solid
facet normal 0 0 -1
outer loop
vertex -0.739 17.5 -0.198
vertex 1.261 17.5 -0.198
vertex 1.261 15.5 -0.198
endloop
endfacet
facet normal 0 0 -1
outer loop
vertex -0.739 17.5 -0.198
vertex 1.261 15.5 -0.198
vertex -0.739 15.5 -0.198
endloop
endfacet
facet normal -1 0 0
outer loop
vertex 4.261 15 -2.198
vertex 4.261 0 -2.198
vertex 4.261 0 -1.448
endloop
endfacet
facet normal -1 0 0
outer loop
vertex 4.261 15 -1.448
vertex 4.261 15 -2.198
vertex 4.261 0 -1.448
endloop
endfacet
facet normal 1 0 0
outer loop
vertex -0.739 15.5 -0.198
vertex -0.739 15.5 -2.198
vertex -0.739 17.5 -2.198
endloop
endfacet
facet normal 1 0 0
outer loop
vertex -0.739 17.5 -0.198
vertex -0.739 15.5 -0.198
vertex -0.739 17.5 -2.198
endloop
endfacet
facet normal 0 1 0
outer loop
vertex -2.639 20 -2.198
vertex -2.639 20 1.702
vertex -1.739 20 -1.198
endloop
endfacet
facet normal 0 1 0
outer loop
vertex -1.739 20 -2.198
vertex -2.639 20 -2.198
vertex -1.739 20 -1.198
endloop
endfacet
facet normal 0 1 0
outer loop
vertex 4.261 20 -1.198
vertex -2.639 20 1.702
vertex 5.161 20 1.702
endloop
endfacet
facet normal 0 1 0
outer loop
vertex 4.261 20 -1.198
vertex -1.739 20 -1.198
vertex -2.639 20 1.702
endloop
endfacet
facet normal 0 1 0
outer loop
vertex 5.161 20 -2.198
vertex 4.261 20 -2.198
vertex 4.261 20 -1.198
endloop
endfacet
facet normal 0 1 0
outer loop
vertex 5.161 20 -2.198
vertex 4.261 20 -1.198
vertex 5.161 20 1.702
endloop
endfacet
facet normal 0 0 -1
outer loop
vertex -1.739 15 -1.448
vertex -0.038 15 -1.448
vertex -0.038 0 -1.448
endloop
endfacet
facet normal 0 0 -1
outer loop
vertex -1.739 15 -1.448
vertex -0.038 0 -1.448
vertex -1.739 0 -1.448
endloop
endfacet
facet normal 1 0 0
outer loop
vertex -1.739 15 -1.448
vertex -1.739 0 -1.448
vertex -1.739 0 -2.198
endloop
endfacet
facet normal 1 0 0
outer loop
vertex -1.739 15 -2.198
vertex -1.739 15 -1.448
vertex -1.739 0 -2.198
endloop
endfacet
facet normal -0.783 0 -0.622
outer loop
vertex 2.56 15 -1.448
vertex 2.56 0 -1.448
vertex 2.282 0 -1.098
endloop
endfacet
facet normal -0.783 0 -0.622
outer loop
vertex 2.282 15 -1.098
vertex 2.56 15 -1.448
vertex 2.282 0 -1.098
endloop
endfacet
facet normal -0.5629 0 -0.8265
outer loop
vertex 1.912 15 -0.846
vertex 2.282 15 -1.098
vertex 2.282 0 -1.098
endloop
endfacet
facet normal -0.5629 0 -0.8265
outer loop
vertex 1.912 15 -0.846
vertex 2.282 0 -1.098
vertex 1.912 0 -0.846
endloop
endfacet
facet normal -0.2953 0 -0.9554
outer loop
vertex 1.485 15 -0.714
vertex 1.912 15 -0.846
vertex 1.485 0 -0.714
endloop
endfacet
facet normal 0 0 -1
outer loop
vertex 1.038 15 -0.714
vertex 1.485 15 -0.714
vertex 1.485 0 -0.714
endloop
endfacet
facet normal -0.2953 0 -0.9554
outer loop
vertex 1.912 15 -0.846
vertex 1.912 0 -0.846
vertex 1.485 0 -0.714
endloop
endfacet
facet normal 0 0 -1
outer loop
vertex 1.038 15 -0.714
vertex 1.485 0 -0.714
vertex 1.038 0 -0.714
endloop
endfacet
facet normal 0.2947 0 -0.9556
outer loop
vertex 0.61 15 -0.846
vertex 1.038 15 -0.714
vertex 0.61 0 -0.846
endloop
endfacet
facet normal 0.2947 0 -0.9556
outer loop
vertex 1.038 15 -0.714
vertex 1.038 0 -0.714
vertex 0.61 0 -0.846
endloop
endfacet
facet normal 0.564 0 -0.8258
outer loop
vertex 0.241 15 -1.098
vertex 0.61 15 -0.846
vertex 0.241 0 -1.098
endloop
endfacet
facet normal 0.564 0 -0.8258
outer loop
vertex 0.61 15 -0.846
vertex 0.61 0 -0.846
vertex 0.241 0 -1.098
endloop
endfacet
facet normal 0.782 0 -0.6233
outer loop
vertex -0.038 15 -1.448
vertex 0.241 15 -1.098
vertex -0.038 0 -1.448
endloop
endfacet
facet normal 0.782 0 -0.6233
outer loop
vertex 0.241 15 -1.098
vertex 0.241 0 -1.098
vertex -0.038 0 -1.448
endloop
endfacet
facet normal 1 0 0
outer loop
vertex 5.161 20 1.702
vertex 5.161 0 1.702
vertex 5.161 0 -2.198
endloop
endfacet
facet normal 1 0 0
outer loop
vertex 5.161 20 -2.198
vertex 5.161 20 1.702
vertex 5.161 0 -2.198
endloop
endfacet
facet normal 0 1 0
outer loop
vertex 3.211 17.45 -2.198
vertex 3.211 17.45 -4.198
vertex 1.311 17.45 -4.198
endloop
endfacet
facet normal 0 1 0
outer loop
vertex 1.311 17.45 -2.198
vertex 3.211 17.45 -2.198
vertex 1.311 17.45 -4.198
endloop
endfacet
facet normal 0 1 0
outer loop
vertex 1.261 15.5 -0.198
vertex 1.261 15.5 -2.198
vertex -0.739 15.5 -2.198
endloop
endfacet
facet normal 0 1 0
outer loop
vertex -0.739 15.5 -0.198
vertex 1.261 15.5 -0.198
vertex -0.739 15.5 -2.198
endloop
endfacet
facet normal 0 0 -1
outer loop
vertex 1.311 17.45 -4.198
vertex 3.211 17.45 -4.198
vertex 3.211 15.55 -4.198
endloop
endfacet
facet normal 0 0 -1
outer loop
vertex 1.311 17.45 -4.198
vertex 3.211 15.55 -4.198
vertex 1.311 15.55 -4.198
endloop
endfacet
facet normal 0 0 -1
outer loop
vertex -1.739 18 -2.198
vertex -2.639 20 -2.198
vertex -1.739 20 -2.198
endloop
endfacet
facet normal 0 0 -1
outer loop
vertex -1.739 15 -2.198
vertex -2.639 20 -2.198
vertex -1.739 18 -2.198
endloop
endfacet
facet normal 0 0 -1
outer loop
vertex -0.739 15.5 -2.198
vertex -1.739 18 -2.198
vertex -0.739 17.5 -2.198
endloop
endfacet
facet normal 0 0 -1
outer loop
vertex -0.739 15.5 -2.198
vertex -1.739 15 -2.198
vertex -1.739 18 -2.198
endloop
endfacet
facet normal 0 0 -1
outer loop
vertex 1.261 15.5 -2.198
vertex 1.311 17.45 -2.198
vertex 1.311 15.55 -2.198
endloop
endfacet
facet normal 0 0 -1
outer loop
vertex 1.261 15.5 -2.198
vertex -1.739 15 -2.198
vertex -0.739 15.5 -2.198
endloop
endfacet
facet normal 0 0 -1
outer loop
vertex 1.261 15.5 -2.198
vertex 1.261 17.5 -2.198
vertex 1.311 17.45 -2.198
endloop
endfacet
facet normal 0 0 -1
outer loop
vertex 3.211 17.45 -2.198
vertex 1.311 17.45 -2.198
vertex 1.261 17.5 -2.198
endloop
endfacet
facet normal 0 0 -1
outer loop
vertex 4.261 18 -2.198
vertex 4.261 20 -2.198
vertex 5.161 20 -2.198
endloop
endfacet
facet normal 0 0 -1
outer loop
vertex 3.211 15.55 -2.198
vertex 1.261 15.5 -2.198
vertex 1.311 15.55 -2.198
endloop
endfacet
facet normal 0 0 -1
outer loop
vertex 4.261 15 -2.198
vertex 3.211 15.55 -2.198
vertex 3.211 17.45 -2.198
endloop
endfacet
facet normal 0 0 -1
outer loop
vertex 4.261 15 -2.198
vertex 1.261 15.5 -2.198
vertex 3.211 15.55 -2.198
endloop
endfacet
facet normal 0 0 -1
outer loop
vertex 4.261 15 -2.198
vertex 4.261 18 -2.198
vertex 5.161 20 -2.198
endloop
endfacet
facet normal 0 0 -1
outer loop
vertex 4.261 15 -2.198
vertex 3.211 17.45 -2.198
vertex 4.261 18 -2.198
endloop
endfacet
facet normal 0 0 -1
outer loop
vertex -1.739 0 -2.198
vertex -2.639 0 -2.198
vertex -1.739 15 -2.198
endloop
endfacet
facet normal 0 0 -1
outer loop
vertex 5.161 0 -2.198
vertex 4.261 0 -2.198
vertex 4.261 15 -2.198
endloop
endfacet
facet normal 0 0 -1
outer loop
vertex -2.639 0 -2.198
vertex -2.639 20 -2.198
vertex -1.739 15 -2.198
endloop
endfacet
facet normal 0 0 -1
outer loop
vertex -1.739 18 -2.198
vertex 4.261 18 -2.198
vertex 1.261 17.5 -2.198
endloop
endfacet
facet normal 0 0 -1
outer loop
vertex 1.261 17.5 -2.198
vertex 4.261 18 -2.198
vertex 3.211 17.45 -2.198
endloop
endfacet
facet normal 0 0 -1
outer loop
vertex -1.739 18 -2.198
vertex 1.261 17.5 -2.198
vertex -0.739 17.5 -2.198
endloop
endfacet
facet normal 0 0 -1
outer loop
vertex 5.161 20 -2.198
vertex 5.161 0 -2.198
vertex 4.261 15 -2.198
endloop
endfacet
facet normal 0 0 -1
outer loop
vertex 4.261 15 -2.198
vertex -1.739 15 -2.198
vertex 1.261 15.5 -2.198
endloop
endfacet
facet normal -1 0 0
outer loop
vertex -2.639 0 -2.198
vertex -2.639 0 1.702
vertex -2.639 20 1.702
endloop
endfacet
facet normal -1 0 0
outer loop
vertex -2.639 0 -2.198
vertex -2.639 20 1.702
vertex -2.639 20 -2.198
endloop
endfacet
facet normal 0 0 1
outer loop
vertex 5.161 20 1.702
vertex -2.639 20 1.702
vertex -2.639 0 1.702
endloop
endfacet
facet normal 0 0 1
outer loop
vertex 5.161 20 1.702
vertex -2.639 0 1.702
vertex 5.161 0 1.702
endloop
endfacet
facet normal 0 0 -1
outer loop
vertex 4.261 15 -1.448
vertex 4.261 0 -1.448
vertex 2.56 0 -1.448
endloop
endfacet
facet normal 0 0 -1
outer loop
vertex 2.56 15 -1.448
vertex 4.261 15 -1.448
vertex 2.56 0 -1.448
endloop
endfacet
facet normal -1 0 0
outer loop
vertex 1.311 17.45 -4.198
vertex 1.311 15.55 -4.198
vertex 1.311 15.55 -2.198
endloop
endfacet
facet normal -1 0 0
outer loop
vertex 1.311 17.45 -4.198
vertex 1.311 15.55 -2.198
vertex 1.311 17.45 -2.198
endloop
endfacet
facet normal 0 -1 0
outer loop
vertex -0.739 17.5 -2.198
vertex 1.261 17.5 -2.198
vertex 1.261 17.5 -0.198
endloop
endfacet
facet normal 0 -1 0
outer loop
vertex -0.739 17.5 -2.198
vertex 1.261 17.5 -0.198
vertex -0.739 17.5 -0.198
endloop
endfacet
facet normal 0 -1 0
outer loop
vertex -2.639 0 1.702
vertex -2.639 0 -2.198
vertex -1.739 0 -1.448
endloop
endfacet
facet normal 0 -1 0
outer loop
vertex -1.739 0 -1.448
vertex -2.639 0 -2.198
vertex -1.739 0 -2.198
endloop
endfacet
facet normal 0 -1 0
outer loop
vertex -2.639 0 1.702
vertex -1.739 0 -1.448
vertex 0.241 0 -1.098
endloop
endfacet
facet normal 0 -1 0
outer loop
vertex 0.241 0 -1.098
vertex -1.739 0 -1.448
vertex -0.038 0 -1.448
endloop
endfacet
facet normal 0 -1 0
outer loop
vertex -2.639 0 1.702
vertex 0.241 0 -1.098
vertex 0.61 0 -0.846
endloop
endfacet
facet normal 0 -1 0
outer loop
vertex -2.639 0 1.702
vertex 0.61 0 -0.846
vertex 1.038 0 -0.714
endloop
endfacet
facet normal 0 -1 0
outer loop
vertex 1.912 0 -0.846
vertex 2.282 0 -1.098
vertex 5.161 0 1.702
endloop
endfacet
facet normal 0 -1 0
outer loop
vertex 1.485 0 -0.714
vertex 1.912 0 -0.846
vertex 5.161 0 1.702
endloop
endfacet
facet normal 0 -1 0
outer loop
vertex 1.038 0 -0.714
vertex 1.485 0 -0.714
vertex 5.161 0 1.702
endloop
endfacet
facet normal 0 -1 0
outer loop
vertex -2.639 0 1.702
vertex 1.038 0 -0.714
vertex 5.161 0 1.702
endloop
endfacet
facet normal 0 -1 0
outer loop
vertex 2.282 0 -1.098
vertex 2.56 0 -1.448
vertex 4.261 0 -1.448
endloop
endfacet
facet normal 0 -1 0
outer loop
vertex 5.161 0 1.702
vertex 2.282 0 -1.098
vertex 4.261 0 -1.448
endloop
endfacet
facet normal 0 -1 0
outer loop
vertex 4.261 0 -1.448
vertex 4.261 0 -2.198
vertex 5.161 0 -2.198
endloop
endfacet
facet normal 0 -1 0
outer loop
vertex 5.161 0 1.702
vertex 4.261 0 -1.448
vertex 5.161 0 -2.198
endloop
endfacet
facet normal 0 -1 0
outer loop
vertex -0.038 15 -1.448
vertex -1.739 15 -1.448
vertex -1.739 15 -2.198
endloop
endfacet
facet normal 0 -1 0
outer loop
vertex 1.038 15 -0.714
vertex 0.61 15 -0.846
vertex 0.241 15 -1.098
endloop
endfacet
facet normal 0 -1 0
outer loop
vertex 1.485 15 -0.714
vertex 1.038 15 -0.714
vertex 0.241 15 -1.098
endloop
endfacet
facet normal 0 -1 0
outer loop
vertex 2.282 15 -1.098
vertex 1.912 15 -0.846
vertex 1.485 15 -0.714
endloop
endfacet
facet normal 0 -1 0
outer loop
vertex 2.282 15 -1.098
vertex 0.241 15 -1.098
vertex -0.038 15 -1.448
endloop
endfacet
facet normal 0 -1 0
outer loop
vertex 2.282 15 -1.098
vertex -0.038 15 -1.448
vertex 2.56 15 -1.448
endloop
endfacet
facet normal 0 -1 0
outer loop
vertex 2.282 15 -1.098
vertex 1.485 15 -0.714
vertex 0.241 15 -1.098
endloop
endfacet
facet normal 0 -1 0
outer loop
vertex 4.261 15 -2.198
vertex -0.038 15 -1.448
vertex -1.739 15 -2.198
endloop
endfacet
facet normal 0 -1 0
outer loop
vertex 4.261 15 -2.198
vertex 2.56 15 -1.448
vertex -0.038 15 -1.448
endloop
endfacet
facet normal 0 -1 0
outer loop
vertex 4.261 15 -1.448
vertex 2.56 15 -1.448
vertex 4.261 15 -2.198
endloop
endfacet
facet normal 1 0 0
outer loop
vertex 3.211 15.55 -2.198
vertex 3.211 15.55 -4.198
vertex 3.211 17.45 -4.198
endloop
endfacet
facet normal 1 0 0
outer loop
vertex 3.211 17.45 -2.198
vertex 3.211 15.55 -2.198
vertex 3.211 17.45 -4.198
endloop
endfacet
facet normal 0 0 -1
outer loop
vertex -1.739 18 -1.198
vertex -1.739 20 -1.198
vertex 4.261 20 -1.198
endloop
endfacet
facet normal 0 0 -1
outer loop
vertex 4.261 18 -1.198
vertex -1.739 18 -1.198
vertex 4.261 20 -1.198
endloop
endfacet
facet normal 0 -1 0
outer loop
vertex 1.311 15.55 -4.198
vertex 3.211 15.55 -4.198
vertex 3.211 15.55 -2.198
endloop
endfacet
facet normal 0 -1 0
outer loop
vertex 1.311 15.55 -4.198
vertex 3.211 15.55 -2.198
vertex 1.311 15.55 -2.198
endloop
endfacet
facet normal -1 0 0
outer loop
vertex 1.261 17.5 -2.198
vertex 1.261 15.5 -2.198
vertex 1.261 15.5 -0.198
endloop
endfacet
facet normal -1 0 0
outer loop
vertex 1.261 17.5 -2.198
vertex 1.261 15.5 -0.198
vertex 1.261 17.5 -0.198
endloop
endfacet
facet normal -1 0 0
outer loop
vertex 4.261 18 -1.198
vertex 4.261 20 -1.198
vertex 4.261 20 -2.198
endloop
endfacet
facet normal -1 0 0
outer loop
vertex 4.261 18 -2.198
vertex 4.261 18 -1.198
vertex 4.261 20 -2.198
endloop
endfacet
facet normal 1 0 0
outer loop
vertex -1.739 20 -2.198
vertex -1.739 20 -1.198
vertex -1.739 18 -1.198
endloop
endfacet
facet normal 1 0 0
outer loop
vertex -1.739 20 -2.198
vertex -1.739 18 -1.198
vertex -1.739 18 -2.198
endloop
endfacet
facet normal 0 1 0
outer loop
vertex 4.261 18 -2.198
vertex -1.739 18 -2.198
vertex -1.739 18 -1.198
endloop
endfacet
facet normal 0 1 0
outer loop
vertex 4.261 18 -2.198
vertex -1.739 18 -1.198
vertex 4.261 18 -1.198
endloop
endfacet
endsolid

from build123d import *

# Parameters (mm, degrees)
SKETCH1_W           = 7.8
SKETCH1_H           = 3.9
BOSS_EXTRUDE1_DEPTH = 20
CUT_EXTRUDE1_DEPTH  = 15
SKETCH4_W           = 6
SKETCH4_H           = 1
CUT_EXTRUDE2_DEPTH  = 2
SKETCH6_W           = 1.9
SKETCH6_H           = 1.9
BOSS_EXTRUDE3_DEPTH = 2
SKETCH7_W           = 2
SKETCH7_H           = 2
CUT_EXTRUDE3_DEPTH  = 2


with BuildPart() as part:
    # Sketch1 → Boss-Extrude1 (new body)
    with BuildSketch(Plane(origin=(0, 0, 0), x_dir=(1, 0, 0), z_dir=(0, 1, 0))):
        with Locations((1.261259263, 0.247513191)):
            Rectangle(SKETCH1_W, SKETCH1_H)
    extrude(amount=BOSS_EXTRUDE1_DEPTH)

    # Sketch3 → Cut-Extrude1 (cut)
    with BuildSketch(Plane.XZ):
        with BuildLine():
            Line((-0.238740737, -2.197513191), (2.761259263, -2.197513191))
            ThreePointArc((2.761259263, -2.197513191), (2.710148003, -1.809284623), (2.560297369, -1.447513191))
            Line((2.560297369, -1.447513191), (-0.037778842, -1.447513191))
            ThreePointArc((-0.037778842, -1.447513191), (-0.187629476, -1.809284623), (-0.238740737, -2.197513191))
        make_face()
        with BuildLine():
            Line((2.761259263, -2.197513191), (4.261259263, -2.197513191))
            Line((4.261259263, -2.197513191), (4.261259263, -1.447513191))
            Line((4.261259263, -1.447513191), (2.560297369, -1.447513191))
            ThreePointArc((2.560297369, -1.447513191), (2.710148003, -1.809284623), (2.761259263, -2.197513191))
        make_face()
        with BuildLine():
            Line((-0.037778842, -1.447513191), (2.560297369, -1.447513191))
            ThreePointArc((2.560297369, -1.447513191), (1.261259263, -0.697513191), (-0.037778842, -1.447513191))
        make_face()
        with BuildLine():
            Line((-1.738740737, -2.197513191), (-0.238740737, -2.197513191))
            ThreePointArc((-0.238740737, -2.197513191), (-0.187629476, -1.809284623), (-0.037778842, -1.447513191))
            Line((-0.037778842, -1.447513191), (-1.738740737, -1.447513191))
            Line((-1.738740737, -1.447513191), (-1.738740737, -2.197513191))
        make_face()
    extrude(amount=-CUT_EXTRUDE1_DEPTH, mode=Mode.SUBTRACT)

    # Sketch4 → Cut-Extrude2 (cut)
    with BuildSketch(Plane(origin=(0, 20, 0), x_dir=(1, 0, 0), z_dir=(0, 1, 0))):
        with Locations((1.261259263, 1.697513191)):
            Rectangle(SKETCH4_W, SKETCH4_H)
    extrude(amount=-CUT_EXTRUDE2_DEPTH, mode=Mode.SUBTRACT)

    # Sketch6 → Boss-Extrude3 (add)
    with BuildSketch(Plane(origin=(0, 0, -2.197513191), x_dir=(-1, 0, 0), z_dir=(0, 0, -1))):
        with Locations((-2.261259263, 16.5)):
            Rectangle(SKETCH6_W, SKETCH6_H)
    extrude(amount=BOSS_EXTRUDE3_DEPTH)

    # Sketch7 → Cut-Extrude3 (cut)
    with BuildSketch(Plane(origin=(0, 0, -2.197513191), x_dir=(-1, 0, 0), z_dir=(0, 0, -1))):
        with Locations((-0.261259263, 16.5)):
            Rectangle(SKETCH7_W, SKETCH7_H)
    extrude(amount=-CUT_EXTRUDE3_DEPTH, mode=Mode.SUBTRACT)


solid = part.part
